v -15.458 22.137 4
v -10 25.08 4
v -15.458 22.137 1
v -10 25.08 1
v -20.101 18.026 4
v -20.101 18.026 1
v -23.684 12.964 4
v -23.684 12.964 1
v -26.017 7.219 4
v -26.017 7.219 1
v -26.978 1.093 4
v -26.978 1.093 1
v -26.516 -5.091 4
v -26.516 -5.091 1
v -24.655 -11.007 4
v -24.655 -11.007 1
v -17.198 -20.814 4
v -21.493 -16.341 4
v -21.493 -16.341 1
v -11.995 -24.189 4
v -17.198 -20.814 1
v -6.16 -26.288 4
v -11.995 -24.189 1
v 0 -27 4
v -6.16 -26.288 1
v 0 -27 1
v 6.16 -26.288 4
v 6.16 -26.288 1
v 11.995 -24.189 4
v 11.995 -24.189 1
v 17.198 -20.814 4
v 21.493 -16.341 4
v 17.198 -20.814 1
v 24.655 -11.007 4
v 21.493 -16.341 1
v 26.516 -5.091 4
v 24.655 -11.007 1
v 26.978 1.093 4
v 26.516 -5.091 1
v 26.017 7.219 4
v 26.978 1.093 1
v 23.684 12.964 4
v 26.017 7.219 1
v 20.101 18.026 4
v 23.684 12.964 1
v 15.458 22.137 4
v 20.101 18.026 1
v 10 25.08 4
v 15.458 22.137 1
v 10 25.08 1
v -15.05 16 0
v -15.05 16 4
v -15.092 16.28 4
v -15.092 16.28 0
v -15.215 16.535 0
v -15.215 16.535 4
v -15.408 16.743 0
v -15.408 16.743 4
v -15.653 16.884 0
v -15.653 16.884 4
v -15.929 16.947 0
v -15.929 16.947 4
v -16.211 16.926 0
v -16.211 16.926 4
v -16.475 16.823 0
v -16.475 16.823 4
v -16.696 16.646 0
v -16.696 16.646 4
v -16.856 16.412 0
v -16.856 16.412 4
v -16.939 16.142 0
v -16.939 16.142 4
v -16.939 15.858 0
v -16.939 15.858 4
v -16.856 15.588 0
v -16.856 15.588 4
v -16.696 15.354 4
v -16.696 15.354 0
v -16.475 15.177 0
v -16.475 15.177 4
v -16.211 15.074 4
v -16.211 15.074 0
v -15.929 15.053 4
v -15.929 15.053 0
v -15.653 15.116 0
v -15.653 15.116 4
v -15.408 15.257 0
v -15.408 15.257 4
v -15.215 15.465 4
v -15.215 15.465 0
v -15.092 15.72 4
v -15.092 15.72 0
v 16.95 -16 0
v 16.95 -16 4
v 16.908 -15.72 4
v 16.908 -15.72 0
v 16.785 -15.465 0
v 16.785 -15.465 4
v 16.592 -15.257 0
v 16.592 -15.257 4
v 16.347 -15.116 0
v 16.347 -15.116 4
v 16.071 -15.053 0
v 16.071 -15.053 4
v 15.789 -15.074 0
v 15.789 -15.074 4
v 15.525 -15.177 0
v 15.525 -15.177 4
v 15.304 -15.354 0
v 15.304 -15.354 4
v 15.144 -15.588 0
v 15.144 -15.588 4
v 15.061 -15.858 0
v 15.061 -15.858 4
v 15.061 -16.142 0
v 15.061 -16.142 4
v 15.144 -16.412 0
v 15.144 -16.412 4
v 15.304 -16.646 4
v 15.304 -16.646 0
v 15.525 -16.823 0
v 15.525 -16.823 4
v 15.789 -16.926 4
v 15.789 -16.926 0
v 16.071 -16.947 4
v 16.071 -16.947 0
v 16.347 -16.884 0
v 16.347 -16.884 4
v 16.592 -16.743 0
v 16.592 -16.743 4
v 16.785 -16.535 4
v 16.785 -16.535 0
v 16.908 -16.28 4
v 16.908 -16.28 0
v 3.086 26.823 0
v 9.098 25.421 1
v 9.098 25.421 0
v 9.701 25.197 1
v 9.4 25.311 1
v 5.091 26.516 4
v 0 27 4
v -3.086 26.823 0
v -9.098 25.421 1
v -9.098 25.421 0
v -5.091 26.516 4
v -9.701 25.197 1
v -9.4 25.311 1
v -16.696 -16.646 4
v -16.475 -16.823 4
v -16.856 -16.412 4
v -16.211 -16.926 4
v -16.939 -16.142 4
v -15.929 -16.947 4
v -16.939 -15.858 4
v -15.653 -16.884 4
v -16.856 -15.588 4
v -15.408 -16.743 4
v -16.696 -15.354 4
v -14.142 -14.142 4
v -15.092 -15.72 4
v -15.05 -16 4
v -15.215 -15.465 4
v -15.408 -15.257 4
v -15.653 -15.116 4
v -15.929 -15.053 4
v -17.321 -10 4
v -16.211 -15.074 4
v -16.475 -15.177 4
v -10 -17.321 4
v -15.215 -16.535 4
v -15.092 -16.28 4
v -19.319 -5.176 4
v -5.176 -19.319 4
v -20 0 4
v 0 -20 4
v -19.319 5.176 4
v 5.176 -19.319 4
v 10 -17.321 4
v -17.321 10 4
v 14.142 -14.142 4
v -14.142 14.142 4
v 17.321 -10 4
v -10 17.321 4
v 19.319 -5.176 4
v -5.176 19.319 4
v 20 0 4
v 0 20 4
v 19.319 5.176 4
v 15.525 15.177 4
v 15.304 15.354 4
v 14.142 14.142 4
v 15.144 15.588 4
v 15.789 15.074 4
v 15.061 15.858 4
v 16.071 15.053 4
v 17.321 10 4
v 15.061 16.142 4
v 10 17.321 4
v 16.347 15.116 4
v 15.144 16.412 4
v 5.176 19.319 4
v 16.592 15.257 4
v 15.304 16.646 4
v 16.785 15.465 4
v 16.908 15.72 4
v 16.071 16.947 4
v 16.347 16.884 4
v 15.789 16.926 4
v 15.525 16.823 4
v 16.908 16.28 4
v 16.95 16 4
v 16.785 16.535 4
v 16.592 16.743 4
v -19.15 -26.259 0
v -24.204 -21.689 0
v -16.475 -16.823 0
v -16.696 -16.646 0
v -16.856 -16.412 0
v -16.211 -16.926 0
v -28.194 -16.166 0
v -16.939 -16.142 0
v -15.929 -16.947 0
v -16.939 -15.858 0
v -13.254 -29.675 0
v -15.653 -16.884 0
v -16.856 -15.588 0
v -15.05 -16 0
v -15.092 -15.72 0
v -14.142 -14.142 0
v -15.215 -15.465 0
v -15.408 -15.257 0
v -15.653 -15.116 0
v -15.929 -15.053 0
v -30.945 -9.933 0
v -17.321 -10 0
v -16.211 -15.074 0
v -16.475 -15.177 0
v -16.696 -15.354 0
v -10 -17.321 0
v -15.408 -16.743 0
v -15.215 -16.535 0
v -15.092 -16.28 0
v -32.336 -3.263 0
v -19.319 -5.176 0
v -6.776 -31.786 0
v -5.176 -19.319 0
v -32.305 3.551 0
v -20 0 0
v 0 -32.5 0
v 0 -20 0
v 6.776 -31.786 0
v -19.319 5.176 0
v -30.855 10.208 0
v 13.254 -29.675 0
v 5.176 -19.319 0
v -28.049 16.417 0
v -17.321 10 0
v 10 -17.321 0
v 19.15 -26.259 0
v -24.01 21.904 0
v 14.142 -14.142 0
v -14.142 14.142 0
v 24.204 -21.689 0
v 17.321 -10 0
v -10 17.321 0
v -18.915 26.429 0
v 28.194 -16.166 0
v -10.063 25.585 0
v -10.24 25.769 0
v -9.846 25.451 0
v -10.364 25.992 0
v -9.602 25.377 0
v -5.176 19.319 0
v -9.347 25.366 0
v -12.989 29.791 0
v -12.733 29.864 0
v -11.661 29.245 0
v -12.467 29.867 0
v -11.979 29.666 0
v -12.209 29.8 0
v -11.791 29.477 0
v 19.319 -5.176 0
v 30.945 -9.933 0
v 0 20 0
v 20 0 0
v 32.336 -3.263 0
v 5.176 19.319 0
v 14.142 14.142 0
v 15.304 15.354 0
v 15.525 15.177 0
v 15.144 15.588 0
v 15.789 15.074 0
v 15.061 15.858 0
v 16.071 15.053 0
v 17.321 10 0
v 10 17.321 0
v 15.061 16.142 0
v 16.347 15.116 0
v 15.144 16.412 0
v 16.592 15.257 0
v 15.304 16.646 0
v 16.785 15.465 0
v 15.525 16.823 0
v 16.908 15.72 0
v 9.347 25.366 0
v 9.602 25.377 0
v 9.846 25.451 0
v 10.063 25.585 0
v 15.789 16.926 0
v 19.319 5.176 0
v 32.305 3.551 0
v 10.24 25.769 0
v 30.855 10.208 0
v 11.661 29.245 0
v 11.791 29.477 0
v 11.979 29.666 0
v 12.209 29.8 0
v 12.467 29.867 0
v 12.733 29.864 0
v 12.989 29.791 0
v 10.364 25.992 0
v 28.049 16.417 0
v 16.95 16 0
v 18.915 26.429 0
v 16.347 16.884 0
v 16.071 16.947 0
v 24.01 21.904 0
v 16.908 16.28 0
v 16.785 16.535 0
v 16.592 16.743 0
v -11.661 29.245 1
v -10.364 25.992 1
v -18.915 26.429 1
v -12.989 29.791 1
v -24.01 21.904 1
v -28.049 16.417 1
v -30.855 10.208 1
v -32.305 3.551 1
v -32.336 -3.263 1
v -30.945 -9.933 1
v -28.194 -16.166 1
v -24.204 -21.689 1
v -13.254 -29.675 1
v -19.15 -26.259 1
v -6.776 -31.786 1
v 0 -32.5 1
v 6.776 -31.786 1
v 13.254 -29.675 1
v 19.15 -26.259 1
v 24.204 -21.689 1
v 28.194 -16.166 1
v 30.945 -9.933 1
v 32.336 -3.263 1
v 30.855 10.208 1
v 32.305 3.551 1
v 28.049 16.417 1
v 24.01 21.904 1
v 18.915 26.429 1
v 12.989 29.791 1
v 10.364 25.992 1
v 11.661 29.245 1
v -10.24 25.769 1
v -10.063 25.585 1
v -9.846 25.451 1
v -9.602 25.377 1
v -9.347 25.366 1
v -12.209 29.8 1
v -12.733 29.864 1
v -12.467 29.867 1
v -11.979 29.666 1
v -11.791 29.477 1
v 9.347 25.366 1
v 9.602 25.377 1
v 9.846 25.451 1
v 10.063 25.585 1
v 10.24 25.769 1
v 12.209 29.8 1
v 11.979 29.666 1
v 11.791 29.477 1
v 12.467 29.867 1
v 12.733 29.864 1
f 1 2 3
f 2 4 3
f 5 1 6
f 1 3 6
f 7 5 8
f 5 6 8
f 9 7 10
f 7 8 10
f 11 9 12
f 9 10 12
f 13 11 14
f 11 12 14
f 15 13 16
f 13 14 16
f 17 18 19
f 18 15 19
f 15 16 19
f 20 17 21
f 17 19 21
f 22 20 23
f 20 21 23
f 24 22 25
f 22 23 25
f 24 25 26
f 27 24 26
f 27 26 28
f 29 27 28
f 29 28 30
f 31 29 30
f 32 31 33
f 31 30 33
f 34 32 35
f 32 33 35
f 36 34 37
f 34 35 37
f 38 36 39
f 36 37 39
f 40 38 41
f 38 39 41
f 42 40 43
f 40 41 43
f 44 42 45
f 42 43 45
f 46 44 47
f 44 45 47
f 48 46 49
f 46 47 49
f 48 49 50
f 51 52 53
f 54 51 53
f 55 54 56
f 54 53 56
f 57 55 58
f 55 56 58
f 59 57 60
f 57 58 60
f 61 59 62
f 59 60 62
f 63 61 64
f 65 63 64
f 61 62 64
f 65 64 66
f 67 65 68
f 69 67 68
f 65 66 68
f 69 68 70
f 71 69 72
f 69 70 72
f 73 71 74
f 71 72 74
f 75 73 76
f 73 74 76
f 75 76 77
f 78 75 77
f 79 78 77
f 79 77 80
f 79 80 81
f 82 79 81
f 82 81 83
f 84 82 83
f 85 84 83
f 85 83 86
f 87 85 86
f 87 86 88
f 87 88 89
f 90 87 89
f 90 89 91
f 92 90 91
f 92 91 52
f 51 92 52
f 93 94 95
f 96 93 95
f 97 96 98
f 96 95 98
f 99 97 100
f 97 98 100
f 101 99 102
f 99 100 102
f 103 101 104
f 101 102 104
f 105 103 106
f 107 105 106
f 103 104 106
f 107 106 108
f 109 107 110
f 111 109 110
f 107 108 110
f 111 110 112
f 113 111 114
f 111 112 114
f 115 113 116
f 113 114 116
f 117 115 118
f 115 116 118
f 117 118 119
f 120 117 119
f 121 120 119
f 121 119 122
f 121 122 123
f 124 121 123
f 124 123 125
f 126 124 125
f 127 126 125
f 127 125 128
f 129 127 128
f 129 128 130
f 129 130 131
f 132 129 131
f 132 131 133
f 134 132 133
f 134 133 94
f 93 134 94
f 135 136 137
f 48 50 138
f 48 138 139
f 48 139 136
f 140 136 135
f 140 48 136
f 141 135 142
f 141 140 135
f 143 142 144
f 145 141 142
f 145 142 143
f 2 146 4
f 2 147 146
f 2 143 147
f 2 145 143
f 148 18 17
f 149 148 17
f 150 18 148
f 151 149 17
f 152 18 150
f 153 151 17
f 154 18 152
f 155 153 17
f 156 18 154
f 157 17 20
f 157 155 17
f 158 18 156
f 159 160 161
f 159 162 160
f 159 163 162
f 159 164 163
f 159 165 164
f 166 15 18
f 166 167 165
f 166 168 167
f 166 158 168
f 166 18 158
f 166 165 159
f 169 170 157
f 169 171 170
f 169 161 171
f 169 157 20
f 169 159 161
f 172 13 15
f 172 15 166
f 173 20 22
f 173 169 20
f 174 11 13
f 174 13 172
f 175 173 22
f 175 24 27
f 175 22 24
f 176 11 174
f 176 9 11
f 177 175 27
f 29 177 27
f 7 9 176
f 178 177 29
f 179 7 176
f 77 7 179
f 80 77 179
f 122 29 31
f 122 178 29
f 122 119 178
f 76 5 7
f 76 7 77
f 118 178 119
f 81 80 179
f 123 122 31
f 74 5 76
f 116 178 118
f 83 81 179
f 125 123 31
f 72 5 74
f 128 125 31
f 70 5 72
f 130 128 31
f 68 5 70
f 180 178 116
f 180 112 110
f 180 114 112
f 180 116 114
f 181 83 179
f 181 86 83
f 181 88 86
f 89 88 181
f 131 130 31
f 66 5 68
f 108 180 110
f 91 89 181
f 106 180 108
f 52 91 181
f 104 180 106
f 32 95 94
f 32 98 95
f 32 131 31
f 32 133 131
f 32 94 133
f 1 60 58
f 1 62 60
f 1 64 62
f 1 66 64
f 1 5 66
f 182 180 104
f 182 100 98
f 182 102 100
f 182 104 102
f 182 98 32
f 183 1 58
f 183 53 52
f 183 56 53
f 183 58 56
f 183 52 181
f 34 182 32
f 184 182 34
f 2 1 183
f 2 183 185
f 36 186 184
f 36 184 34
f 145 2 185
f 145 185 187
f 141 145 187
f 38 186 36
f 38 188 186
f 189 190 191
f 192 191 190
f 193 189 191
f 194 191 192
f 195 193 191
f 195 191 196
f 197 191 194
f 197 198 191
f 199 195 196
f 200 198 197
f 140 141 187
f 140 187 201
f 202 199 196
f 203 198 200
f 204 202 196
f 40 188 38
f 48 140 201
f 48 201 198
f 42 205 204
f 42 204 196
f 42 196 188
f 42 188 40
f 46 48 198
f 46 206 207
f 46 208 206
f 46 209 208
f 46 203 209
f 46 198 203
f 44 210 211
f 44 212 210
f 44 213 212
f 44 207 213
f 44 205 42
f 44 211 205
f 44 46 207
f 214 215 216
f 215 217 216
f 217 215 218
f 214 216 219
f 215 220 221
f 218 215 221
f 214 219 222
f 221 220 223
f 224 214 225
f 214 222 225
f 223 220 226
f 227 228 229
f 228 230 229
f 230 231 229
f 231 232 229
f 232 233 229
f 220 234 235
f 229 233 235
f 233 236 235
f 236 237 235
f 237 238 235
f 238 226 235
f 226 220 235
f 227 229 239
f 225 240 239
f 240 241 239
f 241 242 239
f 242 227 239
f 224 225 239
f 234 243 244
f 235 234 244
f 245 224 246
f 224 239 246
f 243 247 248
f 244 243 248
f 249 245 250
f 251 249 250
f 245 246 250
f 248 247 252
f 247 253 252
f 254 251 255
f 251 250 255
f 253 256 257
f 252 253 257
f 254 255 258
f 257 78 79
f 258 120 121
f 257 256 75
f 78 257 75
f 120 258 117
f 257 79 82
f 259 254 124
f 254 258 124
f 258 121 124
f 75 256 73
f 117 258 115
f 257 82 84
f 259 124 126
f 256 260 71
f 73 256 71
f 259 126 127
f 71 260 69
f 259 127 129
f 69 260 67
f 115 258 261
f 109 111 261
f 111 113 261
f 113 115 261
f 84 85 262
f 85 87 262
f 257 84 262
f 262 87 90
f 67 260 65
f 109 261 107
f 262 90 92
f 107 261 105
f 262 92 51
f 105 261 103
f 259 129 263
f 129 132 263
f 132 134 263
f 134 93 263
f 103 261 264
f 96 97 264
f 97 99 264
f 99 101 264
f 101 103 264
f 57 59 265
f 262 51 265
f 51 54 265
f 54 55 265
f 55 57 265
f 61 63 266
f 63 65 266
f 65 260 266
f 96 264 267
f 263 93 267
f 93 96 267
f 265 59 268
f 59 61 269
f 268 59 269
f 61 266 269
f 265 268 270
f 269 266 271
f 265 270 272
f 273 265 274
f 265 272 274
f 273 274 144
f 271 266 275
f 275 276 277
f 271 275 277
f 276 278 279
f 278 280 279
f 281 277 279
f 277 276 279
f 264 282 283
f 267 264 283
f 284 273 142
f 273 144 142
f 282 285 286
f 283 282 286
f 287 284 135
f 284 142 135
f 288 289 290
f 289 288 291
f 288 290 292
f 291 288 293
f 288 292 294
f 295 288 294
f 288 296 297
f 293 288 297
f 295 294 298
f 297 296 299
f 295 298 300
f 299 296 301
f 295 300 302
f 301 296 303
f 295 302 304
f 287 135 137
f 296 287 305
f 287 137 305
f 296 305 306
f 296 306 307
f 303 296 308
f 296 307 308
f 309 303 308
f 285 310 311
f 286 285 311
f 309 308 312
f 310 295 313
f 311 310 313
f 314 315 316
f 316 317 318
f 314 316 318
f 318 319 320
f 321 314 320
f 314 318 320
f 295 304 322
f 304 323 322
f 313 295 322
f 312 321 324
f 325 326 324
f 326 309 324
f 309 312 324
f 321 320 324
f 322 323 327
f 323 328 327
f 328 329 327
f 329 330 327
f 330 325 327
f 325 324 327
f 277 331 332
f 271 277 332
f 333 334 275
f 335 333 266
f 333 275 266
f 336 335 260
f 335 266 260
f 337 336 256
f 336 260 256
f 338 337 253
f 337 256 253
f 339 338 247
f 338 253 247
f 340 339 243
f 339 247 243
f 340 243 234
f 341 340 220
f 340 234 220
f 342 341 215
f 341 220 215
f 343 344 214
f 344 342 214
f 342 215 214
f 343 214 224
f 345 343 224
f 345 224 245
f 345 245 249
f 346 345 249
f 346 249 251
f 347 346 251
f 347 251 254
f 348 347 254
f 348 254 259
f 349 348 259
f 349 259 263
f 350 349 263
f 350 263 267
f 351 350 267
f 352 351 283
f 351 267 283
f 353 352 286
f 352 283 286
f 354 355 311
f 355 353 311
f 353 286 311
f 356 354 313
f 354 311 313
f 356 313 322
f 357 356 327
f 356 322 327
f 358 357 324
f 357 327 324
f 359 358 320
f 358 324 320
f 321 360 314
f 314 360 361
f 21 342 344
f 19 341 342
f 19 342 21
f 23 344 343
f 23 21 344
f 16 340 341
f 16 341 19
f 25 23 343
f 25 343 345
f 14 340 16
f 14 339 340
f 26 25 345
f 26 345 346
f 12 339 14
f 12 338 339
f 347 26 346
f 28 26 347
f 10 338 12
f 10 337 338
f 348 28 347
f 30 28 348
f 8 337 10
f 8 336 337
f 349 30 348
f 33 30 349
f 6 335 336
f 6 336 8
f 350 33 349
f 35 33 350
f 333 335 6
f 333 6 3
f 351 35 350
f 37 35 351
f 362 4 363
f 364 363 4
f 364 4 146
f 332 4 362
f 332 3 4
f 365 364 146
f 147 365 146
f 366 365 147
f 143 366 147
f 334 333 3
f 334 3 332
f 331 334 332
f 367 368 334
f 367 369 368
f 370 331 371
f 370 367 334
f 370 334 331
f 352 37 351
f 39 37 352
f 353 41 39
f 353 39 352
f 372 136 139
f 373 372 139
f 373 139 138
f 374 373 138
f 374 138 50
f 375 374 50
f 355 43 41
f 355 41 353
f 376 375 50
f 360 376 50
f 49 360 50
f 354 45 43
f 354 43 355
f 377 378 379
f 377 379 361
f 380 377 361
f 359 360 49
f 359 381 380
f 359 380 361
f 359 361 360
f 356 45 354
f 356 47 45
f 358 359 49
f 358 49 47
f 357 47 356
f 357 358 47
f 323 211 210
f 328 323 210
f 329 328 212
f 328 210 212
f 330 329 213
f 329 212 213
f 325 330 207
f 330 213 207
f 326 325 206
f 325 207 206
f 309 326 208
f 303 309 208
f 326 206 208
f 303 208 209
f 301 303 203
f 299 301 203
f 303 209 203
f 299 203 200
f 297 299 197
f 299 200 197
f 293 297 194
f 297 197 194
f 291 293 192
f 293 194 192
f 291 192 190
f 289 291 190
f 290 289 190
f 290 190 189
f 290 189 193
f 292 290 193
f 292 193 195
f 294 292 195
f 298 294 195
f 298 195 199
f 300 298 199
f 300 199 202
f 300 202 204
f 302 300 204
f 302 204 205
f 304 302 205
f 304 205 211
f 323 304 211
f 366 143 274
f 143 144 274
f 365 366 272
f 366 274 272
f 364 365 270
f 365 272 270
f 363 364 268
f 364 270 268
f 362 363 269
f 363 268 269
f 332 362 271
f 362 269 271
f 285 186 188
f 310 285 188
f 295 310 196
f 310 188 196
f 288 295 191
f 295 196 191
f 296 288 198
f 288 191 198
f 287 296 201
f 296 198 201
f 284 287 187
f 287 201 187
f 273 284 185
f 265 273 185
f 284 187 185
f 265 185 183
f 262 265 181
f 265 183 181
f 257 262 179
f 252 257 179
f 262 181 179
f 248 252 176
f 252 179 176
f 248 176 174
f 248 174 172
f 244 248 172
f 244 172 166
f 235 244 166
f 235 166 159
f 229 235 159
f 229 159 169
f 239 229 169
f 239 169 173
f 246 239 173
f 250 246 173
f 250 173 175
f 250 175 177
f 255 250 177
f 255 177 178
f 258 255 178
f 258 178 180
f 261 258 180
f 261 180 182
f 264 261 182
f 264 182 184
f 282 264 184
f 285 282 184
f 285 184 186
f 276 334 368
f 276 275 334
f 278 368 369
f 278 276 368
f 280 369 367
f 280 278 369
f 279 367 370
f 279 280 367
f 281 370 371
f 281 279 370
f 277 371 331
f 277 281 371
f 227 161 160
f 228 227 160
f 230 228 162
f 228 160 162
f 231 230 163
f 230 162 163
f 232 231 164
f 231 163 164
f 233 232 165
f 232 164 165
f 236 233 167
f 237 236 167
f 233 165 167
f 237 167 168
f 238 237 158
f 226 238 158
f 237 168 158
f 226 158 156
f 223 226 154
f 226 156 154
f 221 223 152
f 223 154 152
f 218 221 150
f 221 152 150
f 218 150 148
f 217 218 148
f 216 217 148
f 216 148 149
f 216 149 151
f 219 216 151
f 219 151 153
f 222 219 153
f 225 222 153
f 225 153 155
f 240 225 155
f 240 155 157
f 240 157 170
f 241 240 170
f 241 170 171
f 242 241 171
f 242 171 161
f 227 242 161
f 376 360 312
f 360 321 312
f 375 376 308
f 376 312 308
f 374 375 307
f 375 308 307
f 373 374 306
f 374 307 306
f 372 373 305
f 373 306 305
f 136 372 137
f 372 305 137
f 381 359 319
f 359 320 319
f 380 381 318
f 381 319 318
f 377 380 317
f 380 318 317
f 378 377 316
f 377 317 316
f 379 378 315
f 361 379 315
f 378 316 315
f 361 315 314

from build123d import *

# Parameters (mm, degrees)
SKETCH_R        = 32.5
PAD_DEPTH       = 1
SKETCH001_R     = 27
PAD001_DEPTH    = 3
SKETCH002_R     = 0.95
POCKET_DEPTH    = 5
SKETCH003_R     = 20
POCKET001_DEPTH = 5
FILLET_R        = 1


with BuildPart() as part:
    # Sketch → Pad (new body)
    with BuildSketch(Plane.XY):
        Circle(SKETCH_R)
    extrude(amount=PAD_DEPTH)

    # Sketch001 (on Face3 of Pad) → Pad001 (join)
    with BuildSketch(Plane.XY.offset(1)):
        Circle(SKETCH001_R)
    extrude(amount=PAD001_DEPTH)

    # Sketch002 (on Face5 of Pad001) → Pocket (cut)
    with BuildSketch(Plane.XY.offset(4)):
        with Locations((-16, 16)):
            Circle(SKETCH002_R)
        with Locations((16, 16)):
            Circle(SKETCH002_R)
        with Locations((-16, -16)):
            Circle(SKETCH002_R)
        with Locations((16, -16)):
            Circle(SKETCH002_R)
    extrude(amount=-POCKET_DEPTH, mode=Mode.SUBTRACT)

    # Sketch003 (on Face9 of Pocket) → Pocket001 (cut)
    with BuildSketch(Plane.XY.offset(4)):
        Circle(SKETCH003_R)
        with BuildLine():
            ThreePointArc((10, 25.079872408), (0, 27), (-10, 25.079872408))
            Line((-12.037037037, 30.1887353059), (-10, 25.079872408))
            ThreePointArc((12.037037037, 30.1887353059), (0, 32.5), (-12.037037037, 30.1887353059))
            Line((10, 25.079872408), (12.037037037, 30.1887353059))
        make_face()
    extrude(amount=-POCKET001_DEPTH, mode=Mode.SUBTRACT)

    # Fillet
    fillet_edges = [part.edges().sort_by_distance(p)[0] for p in [
        (12.037037, 30.188735, 0.5),
        (-12.037037, 30.188735, 0.5),
        (-10, 25.079872, 0.5),
        (10, 25.079872, 0.5),
    ]]
    fillet(fillet_edges, radius=FILLET_R)


solid = part.part
